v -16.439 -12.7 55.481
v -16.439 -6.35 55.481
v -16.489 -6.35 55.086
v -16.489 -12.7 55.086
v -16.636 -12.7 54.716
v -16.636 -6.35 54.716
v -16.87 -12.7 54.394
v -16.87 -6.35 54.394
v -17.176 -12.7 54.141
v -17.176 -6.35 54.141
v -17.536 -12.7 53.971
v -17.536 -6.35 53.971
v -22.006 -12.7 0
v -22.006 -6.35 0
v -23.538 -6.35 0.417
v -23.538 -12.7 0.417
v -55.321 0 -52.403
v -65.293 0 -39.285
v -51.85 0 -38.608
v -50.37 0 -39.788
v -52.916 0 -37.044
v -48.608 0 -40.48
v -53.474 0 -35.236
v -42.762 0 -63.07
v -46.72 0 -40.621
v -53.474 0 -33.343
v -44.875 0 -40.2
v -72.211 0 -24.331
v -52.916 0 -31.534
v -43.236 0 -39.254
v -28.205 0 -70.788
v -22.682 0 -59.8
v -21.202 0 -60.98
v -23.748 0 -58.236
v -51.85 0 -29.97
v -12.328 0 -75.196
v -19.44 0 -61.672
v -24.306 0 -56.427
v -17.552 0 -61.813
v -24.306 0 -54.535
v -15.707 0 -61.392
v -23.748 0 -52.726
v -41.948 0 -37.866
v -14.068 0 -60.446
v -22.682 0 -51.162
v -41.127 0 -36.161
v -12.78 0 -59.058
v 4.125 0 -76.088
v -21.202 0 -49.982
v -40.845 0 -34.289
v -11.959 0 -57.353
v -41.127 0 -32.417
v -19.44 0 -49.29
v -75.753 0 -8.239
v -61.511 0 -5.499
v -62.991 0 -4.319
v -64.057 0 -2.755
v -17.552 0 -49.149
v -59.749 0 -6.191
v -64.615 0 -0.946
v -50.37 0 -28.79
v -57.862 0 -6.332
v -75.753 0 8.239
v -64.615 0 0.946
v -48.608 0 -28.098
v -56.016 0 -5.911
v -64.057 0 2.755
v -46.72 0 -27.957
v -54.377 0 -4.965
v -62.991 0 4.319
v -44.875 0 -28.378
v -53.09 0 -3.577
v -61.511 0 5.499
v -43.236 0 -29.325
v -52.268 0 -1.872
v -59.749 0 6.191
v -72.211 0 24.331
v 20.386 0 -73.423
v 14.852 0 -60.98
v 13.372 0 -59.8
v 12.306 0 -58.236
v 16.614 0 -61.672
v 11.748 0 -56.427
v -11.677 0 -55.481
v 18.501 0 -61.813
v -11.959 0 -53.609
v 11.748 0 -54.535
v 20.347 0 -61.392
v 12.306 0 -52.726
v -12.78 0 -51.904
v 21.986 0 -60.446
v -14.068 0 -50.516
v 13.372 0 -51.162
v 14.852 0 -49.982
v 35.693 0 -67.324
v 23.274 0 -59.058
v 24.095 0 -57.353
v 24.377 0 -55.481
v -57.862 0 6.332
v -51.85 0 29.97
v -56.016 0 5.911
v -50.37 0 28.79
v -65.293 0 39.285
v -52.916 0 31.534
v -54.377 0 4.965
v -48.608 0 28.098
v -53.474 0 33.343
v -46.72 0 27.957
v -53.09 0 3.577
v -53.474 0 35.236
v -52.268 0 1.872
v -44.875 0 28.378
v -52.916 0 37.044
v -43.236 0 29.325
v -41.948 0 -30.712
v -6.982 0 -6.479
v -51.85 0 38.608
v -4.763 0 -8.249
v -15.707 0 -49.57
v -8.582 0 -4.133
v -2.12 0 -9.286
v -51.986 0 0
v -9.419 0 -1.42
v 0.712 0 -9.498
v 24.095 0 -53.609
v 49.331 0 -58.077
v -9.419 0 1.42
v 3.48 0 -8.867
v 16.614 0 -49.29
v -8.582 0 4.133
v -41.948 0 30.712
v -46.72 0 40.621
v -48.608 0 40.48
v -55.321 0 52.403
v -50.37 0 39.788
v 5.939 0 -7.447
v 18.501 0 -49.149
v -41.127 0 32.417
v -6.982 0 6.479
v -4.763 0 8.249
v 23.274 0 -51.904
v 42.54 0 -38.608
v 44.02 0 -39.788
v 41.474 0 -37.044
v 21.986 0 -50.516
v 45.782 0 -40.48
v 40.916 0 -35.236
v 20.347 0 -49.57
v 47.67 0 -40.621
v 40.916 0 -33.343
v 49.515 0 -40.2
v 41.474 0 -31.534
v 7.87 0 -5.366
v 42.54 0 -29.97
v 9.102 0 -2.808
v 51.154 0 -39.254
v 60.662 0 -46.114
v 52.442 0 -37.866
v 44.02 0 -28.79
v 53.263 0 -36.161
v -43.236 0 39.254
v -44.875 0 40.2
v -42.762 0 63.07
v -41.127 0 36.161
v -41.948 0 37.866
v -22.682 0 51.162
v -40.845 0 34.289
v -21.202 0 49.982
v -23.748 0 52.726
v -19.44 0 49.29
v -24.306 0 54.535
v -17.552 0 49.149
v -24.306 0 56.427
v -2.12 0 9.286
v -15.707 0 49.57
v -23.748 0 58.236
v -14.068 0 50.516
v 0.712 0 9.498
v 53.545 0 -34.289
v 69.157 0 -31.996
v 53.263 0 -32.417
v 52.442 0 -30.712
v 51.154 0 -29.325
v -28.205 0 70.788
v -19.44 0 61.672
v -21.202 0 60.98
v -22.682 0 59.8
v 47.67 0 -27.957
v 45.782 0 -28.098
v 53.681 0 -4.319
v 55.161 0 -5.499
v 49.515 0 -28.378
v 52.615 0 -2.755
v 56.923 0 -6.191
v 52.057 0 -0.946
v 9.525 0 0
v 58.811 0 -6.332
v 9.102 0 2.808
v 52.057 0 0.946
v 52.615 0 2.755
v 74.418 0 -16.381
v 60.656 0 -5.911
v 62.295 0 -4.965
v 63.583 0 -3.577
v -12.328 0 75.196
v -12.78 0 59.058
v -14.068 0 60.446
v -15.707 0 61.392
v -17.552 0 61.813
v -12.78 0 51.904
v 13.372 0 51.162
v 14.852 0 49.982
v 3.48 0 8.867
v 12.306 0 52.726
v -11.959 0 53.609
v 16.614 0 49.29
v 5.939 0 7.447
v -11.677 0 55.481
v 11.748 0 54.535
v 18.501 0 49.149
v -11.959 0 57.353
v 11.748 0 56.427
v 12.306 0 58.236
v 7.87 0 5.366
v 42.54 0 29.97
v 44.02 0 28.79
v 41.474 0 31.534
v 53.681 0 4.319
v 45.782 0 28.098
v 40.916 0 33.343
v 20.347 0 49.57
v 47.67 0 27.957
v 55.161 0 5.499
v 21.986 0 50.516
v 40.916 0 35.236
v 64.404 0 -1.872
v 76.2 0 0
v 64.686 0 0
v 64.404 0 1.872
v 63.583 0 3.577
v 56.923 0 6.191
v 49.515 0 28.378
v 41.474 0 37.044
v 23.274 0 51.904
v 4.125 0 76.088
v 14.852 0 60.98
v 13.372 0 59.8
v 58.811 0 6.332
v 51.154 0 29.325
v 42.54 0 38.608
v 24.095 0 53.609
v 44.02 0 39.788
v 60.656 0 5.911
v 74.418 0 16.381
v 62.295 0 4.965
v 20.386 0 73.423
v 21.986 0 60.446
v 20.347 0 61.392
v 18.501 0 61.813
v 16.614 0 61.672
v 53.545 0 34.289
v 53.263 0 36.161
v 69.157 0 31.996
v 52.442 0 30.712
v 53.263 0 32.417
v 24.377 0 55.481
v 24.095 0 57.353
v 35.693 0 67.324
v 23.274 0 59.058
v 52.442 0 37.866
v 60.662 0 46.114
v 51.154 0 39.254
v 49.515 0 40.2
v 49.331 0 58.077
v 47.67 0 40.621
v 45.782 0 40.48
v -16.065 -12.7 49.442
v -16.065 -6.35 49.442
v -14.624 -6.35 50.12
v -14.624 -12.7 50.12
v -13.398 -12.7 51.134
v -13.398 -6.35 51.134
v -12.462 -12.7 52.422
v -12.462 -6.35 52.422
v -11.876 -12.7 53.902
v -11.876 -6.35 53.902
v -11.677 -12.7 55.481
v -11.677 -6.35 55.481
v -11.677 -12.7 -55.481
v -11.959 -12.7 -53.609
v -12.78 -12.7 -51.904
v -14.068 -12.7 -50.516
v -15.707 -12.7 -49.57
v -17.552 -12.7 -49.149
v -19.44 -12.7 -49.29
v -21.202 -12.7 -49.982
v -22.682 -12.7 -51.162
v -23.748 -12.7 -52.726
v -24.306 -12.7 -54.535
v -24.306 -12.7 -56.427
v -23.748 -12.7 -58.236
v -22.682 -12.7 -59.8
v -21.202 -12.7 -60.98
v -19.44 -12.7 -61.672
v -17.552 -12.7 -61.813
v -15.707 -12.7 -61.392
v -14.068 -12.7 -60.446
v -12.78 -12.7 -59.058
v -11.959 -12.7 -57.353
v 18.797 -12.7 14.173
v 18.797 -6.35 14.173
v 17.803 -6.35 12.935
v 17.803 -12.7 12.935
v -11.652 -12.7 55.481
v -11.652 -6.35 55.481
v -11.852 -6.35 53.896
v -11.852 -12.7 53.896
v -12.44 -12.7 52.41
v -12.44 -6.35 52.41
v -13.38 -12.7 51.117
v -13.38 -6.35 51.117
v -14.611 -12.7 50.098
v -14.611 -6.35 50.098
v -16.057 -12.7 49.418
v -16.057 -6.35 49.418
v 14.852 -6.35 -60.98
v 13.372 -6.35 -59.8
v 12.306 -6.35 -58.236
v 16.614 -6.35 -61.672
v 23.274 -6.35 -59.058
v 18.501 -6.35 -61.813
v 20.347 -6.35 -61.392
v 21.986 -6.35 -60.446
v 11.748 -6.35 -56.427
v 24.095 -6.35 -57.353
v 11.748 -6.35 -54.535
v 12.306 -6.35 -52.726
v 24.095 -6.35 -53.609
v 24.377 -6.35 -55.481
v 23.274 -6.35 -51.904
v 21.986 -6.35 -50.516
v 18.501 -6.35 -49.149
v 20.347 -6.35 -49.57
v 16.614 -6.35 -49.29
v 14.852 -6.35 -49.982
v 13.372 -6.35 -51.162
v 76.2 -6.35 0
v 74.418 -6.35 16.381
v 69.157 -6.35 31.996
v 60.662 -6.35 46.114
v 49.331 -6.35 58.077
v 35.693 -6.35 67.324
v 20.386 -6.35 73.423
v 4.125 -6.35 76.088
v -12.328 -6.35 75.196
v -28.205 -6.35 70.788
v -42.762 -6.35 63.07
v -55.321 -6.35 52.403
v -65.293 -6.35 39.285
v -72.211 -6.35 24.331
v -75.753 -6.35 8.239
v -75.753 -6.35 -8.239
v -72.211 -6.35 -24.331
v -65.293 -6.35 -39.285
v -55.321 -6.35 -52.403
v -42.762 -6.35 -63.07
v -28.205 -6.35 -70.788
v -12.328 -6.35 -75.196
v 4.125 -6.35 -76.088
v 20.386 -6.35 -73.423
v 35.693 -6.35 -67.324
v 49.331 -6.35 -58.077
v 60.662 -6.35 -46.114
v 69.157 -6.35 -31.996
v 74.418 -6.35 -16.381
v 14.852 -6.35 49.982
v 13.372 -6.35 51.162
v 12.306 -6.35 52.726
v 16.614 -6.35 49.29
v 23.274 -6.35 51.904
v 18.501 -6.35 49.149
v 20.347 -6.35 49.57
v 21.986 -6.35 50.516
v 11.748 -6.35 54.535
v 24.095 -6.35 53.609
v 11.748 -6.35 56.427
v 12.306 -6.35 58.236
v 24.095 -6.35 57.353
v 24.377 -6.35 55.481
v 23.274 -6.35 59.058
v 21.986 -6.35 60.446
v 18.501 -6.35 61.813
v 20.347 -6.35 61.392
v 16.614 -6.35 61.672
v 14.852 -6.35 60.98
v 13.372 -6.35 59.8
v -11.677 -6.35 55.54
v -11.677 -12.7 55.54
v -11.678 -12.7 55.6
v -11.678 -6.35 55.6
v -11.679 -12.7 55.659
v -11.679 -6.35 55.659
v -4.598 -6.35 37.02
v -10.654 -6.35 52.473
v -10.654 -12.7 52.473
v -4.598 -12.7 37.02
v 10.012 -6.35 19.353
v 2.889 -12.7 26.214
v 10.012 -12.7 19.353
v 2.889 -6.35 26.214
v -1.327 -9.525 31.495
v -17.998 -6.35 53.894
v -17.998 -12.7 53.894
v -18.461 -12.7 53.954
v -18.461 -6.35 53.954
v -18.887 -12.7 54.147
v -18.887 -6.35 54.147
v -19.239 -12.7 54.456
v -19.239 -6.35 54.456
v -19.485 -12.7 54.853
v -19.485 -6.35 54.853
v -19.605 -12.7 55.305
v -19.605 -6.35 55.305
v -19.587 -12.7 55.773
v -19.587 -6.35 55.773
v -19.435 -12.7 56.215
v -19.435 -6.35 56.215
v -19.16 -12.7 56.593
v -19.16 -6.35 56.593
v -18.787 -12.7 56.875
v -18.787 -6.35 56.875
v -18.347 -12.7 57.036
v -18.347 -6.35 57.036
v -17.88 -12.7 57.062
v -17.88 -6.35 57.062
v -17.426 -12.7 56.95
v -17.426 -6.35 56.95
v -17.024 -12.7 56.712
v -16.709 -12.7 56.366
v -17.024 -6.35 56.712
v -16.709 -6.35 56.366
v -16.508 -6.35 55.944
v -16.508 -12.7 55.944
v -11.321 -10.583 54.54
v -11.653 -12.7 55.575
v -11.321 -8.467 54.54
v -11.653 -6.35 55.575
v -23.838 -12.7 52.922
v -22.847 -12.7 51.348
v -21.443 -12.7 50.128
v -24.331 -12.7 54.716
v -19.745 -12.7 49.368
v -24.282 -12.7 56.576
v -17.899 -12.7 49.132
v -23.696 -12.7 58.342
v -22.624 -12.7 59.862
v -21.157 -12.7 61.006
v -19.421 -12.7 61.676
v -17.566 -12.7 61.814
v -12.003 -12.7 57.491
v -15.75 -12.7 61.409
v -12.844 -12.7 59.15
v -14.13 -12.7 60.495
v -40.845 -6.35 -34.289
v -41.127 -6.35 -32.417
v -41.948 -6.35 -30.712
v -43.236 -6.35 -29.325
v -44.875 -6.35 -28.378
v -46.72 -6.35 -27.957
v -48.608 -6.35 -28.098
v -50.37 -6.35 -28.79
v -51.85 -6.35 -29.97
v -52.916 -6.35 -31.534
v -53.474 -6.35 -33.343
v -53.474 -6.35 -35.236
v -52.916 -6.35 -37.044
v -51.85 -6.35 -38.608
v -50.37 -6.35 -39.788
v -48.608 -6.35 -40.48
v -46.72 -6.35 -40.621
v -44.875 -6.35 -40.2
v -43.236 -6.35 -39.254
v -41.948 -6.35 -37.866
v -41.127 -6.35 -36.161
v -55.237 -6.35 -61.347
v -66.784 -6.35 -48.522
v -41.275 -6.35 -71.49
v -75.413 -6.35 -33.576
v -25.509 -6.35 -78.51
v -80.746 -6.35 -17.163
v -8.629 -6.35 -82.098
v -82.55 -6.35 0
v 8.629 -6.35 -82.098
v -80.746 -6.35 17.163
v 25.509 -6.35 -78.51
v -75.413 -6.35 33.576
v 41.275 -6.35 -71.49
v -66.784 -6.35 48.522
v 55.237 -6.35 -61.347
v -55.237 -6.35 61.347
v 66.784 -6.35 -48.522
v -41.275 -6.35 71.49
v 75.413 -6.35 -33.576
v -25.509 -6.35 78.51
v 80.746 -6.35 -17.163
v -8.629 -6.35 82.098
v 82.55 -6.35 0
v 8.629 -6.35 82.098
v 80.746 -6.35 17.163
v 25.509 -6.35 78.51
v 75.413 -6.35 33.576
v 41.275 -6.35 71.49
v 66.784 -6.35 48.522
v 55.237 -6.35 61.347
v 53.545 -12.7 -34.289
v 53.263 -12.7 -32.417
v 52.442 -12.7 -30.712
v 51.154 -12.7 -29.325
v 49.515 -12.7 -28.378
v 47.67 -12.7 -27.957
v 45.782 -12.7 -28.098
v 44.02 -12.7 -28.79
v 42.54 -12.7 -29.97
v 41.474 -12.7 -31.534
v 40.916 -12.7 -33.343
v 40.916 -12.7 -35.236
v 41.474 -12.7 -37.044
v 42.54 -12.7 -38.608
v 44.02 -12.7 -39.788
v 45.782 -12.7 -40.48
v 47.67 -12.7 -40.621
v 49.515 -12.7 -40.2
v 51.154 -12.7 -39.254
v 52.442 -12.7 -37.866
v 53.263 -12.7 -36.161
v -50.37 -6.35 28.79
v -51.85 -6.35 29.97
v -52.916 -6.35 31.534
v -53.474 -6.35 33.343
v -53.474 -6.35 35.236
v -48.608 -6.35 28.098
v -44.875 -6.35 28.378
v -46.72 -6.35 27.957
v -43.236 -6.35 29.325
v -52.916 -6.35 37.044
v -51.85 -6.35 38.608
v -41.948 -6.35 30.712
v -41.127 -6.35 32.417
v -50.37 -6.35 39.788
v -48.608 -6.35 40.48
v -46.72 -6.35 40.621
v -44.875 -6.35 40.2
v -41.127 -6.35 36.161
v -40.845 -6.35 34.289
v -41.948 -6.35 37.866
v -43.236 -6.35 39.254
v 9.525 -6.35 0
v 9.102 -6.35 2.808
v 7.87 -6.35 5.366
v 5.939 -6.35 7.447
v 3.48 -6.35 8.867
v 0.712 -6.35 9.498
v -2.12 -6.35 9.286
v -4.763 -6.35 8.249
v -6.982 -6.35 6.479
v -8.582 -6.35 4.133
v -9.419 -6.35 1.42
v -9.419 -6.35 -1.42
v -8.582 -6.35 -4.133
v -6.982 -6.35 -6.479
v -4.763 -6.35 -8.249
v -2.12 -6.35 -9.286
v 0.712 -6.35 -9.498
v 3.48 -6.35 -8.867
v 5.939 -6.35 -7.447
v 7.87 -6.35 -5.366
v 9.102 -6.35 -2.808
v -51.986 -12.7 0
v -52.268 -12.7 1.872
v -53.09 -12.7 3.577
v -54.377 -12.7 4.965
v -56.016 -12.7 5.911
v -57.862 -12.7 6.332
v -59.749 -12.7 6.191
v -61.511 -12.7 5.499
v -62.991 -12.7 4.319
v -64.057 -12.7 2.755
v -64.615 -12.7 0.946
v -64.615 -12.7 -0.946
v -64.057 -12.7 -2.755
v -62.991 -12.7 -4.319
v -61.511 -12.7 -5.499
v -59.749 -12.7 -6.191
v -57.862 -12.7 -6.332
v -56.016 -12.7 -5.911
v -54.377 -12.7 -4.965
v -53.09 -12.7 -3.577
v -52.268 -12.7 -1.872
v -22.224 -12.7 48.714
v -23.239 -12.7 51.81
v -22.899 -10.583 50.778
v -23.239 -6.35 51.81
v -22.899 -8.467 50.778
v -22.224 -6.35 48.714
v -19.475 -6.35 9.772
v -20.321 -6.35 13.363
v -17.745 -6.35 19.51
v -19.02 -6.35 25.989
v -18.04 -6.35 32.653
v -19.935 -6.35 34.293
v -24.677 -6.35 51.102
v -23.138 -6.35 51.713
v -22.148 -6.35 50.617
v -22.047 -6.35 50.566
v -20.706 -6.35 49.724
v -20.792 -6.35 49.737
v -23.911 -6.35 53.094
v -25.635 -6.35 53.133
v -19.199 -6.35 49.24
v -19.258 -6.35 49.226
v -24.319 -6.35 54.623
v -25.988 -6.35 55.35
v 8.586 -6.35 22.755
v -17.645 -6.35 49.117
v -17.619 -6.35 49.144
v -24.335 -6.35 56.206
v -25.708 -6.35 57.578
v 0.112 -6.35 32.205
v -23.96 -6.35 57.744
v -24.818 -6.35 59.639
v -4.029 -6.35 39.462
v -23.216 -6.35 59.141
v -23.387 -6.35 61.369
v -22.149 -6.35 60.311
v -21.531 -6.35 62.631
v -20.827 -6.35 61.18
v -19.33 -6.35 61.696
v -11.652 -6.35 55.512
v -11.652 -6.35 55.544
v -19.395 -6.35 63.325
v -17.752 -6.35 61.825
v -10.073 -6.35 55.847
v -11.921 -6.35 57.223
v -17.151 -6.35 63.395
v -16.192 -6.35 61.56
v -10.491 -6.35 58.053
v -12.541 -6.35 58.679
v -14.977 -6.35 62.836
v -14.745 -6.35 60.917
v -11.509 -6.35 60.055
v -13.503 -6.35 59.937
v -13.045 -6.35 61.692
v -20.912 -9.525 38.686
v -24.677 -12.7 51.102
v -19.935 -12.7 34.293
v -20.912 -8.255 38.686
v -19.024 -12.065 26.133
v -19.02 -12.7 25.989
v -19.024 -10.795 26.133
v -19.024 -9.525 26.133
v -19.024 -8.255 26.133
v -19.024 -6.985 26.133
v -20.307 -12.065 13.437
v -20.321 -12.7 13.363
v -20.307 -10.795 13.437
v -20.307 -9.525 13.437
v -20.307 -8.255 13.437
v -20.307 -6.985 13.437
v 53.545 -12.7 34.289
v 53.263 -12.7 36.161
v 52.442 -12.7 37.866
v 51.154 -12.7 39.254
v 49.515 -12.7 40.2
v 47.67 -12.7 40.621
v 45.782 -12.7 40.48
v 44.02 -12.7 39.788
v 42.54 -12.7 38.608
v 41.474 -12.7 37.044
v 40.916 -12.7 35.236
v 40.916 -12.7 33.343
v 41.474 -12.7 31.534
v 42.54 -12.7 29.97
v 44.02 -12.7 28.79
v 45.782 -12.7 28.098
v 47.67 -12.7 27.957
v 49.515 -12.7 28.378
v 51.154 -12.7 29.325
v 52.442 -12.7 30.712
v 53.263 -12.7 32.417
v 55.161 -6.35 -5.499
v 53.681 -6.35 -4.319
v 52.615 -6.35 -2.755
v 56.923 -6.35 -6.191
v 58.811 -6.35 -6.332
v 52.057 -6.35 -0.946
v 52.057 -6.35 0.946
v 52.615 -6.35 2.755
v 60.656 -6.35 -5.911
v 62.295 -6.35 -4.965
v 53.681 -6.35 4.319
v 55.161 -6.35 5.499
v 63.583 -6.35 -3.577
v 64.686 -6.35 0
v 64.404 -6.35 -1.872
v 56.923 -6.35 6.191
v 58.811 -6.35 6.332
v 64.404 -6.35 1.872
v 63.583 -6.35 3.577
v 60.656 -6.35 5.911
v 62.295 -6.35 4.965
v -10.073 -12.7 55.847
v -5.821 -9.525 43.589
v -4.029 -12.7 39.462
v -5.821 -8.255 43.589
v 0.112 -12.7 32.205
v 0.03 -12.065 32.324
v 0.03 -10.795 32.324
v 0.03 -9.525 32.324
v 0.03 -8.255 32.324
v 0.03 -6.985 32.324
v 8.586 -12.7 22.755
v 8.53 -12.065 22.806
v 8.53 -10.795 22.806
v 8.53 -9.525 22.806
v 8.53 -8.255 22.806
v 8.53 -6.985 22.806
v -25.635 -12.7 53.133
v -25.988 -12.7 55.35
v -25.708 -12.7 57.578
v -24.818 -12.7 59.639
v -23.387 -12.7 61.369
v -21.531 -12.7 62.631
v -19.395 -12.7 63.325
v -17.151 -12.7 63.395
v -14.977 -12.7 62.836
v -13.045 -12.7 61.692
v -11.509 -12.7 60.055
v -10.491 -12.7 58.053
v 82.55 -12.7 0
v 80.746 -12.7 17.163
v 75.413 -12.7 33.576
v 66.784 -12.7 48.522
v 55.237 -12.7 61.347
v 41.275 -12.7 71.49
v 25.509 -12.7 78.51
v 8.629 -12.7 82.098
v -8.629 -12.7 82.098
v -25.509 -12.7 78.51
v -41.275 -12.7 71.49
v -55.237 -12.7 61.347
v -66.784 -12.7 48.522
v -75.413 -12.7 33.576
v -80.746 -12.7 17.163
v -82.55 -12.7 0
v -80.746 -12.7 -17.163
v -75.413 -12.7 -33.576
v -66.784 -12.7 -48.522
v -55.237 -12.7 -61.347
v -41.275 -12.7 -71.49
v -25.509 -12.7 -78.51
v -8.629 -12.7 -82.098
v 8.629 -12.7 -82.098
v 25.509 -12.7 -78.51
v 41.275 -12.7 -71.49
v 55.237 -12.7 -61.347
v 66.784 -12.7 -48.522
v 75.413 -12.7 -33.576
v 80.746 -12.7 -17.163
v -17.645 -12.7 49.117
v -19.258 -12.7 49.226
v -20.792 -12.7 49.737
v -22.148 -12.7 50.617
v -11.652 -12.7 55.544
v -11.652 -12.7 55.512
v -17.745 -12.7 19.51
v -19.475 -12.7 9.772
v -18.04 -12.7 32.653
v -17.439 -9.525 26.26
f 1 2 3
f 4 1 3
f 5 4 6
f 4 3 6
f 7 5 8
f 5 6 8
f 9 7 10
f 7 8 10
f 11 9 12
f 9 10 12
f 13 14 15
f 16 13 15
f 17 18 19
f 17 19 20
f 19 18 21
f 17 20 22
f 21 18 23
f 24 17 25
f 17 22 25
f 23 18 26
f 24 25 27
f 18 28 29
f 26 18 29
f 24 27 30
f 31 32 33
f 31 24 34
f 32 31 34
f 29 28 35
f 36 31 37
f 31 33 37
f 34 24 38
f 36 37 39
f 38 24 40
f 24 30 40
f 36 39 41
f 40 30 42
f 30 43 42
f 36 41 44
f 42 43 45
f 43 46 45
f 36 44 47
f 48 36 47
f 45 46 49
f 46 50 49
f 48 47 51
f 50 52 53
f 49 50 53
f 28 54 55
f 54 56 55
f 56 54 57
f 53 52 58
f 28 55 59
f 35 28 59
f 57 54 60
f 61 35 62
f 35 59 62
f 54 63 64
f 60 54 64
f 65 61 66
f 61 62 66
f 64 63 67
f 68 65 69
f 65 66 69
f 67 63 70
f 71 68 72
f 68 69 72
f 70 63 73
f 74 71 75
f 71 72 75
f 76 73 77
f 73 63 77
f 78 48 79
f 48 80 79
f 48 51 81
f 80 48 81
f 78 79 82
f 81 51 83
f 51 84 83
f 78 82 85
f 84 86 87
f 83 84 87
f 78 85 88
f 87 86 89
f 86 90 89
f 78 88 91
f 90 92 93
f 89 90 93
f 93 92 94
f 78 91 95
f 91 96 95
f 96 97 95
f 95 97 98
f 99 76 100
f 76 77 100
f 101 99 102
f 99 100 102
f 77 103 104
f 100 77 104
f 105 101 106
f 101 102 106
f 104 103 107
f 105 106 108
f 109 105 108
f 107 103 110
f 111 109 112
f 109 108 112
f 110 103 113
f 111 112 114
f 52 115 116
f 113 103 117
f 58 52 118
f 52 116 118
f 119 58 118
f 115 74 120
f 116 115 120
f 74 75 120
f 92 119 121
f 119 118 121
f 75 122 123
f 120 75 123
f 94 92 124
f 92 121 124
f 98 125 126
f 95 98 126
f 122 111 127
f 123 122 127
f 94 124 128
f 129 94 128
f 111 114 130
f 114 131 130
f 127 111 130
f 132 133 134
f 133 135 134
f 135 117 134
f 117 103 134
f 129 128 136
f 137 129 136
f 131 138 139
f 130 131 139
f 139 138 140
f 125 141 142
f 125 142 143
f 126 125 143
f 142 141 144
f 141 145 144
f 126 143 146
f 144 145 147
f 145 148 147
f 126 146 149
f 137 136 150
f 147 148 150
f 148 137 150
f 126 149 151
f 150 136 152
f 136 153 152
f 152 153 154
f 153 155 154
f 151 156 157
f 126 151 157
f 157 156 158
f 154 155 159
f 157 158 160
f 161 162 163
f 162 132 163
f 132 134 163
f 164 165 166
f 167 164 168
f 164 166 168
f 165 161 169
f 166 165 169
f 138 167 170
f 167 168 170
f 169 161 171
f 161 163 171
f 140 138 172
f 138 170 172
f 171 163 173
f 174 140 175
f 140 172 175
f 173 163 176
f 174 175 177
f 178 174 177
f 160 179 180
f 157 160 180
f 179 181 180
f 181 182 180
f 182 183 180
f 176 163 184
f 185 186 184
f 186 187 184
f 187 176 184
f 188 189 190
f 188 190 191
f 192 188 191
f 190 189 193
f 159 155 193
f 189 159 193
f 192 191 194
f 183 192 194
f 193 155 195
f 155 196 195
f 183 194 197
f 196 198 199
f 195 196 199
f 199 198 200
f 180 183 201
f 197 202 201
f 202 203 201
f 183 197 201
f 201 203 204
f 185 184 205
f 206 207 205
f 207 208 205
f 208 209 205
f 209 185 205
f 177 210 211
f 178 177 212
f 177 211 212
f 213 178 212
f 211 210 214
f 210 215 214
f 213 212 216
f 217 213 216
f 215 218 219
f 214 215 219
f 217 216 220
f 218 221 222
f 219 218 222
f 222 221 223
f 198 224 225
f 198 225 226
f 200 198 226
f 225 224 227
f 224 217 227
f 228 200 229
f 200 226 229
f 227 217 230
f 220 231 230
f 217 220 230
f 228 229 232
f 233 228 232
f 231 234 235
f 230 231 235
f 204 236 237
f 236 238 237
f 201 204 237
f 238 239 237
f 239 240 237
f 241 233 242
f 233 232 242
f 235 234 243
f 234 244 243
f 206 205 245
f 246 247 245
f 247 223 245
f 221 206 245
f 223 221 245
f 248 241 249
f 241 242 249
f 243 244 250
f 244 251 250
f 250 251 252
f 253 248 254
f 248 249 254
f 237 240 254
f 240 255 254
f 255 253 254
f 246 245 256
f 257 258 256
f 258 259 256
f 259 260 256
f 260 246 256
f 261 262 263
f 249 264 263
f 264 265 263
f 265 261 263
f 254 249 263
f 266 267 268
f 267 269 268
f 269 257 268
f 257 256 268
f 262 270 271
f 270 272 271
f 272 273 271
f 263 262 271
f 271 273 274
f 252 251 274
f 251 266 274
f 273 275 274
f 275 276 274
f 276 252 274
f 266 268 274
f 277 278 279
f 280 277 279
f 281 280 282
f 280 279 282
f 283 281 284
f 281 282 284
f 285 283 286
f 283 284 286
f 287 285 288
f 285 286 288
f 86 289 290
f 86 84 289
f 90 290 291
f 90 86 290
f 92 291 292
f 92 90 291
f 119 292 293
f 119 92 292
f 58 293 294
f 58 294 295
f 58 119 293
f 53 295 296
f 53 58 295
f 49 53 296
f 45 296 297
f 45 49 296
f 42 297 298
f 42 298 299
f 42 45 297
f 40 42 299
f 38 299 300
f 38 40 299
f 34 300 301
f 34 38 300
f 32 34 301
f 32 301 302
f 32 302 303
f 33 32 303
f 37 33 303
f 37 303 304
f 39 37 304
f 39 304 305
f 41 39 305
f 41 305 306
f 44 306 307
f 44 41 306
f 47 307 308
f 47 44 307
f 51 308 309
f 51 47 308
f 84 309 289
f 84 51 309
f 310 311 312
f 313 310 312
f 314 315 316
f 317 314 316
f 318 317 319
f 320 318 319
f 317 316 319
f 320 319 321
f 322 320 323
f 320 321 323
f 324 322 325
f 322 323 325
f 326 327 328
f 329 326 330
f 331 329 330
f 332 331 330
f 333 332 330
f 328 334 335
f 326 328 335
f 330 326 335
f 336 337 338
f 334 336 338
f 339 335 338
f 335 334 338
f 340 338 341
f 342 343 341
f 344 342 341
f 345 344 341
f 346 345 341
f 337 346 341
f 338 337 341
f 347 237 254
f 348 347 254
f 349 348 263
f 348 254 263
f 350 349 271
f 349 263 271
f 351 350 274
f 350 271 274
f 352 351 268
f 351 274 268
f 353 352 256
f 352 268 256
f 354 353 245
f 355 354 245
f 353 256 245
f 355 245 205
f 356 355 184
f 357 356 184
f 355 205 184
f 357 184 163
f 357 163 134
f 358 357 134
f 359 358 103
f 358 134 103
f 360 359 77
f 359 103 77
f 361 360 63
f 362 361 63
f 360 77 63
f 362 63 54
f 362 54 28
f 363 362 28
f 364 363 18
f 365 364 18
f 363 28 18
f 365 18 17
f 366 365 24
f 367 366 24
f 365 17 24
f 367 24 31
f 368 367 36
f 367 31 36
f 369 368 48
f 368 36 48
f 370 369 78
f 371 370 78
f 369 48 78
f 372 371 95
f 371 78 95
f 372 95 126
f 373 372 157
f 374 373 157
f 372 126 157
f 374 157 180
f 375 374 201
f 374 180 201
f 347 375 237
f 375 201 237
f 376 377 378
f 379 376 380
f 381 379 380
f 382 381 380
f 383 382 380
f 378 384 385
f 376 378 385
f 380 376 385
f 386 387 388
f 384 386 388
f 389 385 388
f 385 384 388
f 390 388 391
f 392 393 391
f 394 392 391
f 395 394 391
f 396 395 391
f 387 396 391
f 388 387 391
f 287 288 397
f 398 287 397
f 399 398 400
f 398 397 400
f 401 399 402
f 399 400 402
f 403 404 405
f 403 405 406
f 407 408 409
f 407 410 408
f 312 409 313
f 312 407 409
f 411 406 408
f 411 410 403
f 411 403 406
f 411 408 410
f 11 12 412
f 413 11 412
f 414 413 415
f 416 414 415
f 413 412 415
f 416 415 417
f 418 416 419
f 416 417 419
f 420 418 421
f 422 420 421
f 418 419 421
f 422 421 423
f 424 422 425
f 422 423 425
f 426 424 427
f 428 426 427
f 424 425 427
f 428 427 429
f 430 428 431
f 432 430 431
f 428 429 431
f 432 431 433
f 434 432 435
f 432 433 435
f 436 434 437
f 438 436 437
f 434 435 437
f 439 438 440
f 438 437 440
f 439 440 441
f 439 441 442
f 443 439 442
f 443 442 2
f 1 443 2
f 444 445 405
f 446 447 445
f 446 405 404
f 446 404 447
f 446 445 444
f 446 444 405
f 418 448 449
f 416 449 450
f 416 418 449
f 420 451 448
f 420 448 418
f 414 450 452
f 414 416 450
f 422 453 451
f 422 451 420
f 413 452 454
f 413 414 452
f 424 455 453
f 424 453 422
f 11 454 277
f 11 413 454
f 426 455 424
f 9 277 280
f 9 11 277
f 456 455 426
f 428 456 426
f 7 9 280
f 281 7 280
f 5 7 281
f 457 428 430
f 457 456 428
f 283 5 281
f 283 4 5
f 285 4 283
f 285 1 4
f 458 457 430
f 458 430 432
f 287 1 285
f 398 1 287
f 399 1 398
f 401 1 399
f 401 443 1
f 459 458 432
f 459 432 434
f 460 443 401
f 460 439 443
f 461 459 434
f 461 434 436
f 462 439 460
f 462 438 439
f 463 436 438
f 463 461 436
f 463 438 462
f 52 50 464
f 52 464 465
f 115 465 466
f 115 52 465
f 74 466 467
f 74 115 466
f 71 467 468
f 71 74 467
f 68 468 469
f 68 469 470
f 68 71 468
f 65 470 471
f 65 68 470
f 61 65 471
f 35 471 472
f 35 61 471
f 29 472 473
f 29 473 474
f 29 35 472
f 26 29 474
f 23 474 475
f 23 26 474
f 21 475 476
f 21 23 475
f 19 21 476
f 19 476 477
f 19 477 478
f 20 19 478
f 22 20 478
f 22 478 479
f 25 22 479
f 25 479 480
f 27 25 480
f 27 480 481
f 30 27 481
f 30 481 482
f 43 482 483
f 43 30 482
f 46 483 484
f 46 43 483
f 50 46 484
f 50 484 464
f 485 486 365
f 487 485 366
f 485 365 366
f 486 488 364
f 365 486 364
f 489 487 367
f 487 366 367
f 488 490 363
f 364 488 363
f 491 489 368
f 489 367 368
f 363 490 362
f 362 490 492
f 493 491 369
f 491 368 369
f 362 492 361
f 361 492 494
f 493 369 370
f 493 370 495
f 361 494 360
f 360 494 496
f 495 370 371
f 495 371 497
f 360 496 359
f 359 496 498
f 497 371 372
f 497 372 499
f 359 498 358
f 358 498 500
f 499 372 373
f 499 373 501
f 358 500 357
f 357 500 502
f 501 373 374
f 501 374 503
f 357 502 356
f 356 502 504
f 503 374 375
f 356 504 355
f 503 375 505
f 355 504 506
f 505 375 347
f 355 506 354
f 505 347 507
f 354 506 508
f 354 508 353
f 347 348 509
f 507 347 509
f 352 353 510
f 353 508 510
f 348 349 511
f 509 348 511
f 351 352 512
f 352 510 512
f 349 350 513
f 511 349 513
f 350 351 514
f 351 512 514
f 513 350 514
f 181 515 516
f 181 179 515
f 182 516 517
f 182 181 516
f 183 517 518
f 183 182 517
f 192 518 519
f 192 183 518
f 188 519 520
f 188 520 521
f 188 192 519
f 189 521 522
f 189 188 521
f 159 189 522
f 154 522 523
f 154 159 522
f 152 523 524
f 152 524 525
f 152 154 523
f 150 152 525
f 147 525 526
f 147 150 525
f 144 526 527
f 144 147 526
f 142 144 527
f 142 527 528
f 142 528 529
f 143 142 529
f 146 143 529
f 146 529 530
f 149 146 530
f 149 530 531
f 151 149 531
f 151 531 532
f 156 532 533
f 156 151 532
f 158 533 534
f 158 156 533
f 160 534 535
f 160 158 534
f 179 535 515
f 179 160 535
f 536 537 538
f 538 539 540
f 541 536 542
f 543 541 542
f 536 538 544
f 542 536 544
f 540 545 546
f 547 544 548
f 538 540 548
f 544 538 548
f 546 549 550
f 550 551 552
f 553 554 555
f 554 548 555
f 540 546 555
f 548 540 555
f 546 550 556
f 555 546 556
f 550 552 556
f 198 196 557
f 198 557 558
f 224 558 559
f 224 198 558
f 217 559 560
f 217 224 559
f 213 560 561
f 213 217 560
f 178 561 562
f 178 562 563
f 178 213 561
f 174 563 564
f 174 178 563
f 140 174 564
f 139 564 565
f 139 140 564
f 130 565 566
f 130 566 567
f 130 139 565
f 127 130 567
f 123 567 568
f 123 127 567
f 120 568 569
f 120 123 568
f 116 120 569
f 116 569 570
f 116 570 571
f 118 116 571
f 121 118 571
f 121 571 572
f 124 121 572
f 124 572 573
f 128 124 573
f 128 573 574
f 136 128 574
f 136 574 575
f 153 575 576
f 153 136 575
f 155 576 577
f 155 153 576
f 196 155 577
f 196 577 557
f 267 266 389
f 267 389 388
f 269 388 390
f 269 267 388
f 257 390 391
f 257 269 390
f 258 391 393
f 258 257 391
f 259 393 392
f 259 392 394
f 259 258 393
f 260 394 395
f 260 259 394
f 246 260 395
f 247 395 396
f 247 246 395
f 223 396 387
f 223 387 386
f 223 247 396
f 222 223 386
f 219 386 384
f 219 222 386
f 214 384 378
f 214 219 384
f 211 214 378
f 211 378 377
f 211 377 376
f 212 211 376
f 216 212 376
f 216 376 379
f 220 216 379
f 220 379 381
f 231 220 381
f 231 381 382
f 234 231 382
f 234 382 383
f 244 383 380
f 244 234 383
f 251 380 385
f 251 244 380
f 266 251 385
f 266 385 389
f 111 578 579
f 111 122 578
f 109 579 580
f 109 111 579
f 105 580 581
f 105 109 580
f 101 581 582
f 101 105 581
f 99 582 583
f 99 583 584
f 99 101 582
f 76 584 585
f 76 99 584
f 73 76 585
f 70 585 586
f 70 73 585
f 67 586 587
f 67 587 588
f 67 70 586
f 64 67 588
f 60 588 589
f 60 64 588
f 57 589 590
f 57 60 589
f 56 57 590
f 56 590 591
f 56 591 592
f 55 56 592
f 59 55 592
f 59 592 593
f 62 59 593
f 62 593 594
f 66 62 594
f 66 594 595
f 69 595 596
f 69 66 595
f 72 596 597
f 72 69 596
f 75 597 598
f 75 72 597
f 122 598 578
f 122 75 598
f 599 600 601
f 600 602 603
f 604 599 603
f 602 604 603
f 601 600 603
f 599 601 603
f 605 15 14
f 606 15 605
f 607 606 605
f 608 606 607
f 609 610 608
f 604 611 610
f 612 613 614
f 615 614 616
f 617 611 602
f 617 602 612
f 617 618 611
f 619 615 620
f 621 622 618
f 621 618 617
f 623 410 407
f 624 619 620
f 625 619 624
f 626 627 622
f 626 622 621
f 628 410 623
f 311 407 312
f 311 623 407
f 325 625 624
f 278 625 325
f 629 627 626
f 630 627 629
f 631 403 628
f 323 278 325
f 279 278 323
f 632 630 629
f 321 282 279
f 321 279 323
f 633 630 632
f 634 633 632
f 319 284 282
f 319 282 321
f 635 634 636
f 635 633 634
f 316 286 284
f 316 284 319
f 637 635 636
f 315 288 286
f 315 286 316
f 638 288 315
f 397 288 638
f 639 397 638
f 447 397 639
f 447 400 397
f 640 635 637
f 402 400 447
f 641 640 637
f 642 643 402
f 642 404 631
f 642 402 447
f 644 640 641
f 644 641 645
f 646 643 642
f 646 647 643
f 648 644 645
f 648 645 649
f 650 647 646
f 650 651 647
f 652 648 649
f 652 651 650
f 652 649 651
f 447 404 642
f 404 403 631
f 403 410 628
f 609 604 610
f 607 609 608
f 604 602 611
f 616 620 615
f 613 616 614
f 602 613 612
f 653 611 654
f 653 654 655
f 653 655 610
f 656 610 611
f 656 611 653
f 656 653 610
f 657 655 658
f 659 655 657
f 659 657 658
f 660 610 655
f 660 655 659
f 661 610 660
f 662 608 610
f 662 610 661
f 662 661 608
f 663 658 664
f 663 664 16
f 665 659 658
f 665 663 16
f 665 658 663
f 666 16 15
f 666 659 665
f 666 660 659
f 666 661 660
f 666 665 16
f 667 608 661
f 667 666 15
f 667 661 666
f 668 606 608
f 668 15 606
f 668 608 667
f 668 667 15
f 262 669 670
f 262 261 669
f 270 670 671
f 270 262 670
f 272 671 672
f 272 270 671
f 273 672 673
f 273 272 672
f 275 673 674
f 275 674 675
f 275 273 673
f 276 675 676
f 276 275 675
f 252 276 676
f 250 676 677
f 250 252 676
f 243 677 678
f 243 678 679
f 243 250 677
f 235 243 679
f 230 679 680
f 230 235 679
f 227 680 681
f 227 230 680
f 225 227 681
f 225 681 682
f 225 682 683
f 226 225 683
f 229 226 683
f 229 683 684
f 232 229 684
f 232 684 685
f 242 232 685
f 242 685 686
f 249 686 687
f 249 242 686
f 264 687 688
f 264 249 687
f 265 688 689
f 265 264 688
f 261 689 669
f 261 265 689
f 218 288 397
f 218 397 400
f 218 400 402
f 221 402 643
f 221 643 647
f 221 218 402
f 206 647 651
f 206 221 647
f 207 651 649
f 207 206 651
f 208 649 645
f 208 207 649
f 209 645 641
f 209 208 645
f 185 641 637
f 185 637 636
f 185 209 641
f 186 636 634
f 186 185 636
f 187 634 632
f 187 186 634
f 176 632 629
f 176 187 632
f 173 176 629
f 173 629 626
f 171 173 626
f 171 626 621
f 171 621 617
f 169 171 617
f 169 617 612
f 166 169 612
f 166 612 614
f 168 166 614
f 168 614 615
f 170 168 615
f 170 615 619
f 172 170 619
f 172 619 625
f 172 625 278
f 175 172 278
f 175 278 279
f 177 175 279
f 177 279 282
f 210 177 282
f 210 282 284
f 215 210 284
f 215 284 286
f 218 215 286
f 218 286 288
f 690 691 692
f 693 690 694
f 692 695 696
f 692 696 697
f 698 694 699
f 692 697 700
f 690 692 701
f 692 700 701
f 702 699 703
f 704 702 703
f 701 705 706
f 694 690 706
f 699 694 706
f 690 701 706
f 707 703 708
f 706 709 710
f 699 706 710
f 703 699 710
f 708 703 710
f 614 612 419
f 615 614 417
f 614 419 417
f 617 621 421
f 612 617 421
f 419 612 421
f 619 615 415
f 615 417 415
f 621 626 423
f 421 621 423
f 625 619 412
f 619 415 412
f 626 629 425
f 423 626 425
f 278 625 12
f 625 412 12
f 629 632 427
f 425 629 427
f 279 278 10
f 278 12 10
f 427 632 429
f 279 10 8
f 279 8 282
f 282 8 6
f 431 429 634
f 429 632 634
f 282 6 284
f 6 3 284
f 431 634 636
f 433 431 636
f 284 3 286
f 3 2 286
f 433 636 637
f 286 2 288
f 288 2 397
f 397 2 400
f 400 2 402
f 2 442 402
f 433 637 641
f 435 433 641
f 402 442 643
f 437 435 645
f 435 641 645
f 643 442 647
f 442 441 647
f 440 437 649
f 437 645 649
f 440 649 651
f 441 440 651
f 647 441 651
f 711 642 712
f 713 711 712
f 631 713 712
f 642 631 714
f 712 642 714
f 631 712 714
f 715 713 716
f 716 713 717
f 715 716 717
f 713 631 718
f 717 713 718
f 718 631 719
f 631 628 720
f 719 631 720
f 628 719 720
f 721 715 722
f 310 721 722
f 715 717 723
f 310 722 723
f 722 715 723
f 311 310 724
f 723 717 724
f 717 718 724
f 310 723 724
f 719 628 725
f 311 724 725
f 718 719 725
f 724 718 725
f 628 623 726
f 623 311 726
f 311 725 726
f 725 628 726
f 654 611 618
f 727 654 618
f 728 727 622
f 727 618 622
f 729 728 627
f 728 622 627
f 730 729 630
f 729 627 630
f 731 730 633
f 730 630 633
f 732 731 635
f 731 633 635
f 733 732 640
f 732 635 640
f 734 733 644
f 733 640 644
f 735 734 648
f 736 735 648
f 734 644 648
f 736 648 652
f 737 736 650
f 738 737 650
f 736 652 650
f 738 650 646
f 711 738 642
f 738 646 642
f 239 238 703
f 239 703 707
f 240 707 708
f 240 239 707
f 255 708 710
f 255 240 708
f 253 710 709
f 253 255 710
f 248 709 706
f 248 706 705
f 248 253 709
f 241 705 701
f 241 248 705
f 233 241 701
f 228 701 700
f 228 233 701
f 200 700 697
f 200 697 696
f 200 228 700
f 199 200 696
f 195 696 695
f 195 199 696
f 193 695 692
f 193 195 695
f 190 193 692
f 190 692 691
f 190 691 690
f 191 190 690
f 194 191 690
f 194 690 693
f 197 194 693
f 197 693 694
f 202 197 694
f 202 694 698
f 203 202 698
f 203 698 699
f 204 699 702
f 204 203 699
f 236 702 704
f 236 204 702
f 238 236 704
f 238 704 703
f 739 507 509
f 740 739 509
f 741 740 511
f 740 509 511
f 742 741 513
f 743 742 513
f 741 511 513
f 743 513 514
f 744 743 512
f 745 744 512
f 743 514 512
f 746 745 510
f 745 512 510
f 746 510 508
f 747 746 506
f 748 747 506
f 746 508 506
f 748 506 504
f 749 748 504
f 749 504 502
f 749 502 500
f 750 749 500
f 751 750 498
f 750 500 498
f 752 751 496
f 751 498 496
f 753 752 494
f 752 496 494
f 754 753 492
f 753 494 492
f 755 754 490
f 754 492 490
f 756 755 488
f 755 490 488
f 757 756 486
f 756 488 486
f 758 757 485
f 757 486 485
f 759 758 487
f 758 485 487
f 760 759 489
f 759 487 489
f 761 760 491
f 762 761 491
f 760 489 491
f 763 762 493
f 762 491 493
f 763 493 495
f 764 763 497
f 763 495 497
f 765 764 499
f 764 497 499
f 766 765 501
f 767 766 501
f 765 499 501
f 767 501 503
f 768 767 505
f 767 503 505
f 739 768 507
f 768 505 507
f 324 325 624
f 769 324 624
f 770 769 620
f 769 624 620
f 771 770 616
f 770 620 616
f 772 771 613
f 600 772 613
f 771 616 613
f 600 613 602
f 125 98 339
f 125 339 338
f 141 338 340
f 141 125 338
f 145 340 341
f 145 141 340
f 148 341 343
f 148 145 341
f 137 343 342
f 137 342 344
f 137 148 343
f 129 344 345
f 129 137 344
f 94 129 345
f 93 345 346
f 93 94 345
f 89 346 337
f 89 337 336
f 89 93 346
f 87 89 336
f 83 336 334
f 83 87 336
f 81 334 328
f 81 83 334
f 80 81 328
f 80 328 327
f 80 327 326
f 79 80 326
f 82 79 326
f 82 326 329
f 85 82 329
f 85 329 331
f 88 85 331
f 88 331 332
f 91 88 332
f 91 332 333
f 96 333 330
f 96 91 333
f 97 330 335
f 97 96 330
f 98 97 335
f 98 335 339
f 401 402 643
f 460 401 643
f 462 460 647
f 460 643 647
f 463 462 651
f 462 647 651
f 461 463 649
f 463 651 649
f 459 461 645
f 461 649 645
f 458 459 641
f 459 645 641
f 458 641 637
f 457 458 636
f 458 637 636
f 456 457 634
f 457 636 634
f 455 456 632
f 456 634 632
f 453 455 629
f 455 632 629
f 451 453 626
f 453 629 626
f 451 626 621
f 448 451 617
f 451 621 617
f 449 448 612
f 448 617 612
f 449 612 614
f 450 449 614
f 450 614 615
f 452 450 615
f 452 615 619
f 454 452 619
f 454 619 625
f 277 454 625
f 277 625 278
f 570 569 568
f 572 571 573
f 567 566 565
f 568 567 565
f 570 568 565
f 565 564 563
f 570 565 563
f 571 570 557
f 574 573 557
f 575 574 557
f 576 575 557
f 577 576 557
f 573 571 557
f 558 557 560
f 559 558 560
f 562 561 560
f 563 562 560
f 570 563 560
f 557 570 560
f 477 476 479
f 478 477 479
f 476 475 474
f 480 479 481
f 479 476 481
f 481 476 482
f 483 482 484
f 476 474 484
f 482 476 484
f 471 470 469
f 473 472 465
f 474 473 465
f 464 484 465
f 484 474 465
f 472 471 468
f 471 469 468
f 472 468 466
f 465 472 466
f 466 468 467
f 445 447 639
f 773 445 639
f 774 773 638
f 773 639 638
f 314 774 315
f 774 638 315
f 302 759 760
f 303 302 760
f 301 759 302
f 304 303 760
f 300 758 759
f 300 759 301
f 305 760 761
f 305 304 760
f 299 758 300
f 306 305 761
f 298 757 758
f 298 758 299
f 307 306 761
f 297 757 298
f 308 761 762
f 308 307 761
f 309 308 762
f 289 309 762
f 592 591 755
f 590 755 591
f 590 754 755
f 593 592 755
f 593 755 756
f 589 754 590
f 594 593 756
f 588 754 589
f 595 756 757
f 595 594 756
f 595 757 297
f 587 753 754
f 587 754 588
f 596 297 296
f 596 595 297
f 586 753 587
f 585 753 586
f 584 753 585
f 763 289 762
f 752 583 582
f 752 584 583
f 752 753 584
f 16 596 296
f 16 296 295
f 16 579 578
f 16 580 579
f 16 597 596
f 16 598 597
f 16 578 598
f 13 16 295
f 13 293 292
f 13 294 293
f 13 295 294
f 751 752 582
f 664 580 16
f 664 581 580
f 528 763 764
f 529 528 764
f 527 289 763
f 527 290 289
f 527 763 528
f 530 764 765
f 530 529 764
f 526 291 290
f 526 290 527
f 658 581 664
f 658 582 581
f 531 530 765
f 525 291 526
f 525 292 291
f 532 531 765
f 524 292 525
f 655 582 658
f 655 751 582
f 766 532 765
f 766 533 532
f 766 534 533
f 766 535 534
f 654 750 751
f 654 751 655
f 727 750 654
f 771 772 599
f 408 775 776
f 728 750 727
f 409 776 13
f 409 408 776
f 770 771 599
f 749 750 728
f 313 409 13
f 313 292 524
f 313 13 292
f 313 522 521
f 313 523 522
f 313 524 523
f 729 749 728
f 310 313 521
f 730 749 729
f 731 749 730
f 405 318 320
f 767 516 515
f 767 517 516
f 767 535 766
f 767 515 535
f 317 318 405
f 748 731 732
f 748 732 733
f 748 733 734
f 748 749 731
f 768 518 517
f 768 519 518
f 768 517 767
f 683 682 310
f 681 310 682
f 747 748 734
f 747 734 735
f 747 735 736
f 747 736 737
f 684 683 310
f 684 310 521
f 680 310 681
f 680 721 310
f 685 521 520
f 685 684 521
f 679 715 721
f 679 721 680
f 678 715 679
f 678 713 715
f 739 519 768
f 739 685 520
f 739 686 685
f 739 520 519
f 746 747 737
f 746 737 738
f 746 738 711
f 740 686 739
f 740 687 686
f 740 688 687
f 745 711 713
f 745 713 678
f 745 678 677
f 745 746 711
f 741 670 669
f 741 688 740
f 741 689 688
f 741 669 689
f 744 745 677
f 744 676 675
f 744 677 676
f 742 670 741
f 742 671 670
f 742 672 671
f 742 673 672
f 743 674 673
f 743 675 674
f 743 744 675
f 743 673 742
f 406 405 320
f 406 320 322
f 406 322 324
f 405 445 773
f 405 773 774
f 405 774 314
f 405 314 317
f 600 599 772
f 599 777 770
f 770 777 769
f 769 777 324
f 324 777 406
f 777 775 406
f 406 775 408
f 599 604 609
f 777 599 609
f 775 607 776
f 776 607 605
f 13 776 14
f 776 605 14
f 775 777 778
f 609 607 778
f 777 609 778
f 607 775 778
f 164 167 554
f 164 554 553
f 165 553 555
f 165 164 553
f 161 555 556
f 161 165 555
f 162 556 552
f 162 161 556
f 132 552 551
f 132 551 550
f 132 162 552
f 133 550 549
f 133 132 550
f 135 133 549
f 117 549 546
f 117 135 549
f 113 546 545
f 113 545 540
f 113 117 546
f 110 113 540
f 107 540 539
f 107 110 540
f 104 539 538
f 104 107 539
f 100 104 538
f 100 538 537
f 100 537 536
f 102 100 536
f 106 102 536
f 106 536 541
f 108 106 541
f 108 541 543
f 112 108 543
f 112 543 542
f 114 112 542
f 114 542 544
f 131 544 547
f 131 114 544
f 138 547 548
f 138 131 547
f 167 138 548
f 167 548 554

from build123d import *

# Parameters (mm, degrees)
F0_R     = 76.2
F0_R_2   = 6.35
F0_R_3   = 9.525
F1_DEPTH = 6.35
F2_R     = 82.55
F2_R_2   = 76.2
F2_R_3   = 6.35
F3_DEPTH = 6.35


# Not quite as in the source:
# - a length typed as a fraction of an inch, garbled in the dataset ("3 / 203.2 mm" for 3/8 in), is restored
# - the dataset's text gives a spline's control points without its knots; the knots are read off the source's solid


with BuildPart() as f1:
    # F0 (on Front) → F1 (new body)
    with BuildSketch(Plane.XZ):
        Circle(F0_R)
        with Locations((-18.0268847294, -55.4810463583)):
            Circle(F0_R_2, mode=Mode.SUBTRACT)
        with Locations((-47.1949969329, -34.2891723808)):
            Circle(F0_R_2, mode=Mode.SUBTRACT)
        with Locations((18.0268847294, -55.4810463583)):
            Circle(F0_R_2, mode=Mode.SUBTRACT)
        with Locations((47.1949969329, -34.2891723808)):
            Circle(F0_R_2, mode=Mode.SUBTRACT)
        with Locations((-58.336224407, 0)):
            Circle(F0_R_2, mode=Mode.SUBTRACT)
        with Locations((-47.1949969329, 34.2891723808)):
            Circle(F0_R_2, mode=Mode.SUBTRACT)
        with Locations((-18.0268847294, 55.4810463583)):
            Circle(F0_R_2, mode=Mode.SUBTRACT)
        Circle(F0_R_3, mode=Mode.SUBTRACT)
        with Locations((58.336224407, 0)):
            Circle(F0_R_2, mode=Mode.SUBTRACT)
        with Locations((47.1949969329, 34.2891723808)):
            Circle(F0_R_2, mode=Mode.SUBTRACT)
        with Locations((18.0268847294, 55.4810463583)):
            Circle(F0_R_2, mode=Mode.SUBTRACT)
    extrude(amount=F1_DEPTH)

    # F2 (on face) → F3 (join)
    with BuildSketch(Plane.XZ.offset(6.35)):
        Circle(F2_R)
        Circle(F2_R_2, mode=Mode.SUBTRACT)
        Circle(F2_R_2)
        with Locations((-18.0268847294, -55.4810463583)):
            Circle(F2_R_3, mode=Mode.SUBTRACT)
        with Locations((-47.1949969329, -34.2891723808)):
            Circle(F2_R_3, mode=Mode.SUBTRACT)
        with Locations((18.0268847294, -55.4810463583)):
            Circle(F2_R_3, mode=Mode.SUBTRACT)
        with Locations((47.1949969329, -34.2891723808)):
            Circle(F2_R_3, mode=Mode.SUBTRACT)
        with Locations((-58.336224407, 0)):
            Circle(F2_R_3, mode=Mode.SUBTRACT)
        with Locations((-47.1949969329, 34.2891723808)):
            Circle(F2_R_3, mode=Mode.SUBTRACT)
        with BuildLine():
            add(Edge.make_bspline(
                [(-10.6542657196, 52.4734320289), (-8.2332526855, 45.0247226448), (-2.5822173462, 29.3020077299), (10.6983686228, 18.6386544846), (17.8031913761, 12.934775669)],
                knots=[0.0620717582, 0.0620717582, 0.0620717582, 0.0620717582, 0.4982746672, 1, 1, 1, 1], degree=3))
            ThreePointArc((-10.6542657196, 52.4734320289), (-12.6062796926, 49.6485258008), (-15.5663398463, 47.908267879))
            ThreePointArc((-15.5663398463, 47.908267879), (-18.9839767566, 47.5762864081), (-22.223627454, 48.7143185285))
            add(Edge.make_bspline(
                [(-22.223627454, 48.7143185285), (-19.8040266177, 41.2651502936), (-15.13423029, 25.2236114971), (-19.6106882565, 8.7906449303), (-22.0059547573, 0)],
                knots=[0.0620717582, 0.0620717582, 0.0620717582, 0.0620717582, 0.4982746672, 1, 1, 1, 1], degree=3))
            Line((-22.0059547573, 0), (-23.5376137966, 0.4173449862))
            add(Edge.make_bspline(
                [(-24.6771337574, 51.1020689794), (-24.0063692851, 49.0670118083), (-22.6416674455, 44.9146579119), (-20.8291476072, 38.6791660774), (-19.7093838867, 33.4359520654), (-19.1757596195, 29.2572537264), (-18.9844511798, 26.1346205763), (-19.0278027605, 23.000080355), (-19.360603347, 18.7820552575), (-20.2248090599, 13.4503695291), (-21.7522886479, 6.9703254819), (-22.940861019, 2.6074318834), (-23.5376137966, 0.4173449862)],
                knots=[0.0057570398, 0.0057570398, 0.0057570398, 0.0057570398, 0.125, 0.25, 0.375, 0.4375, 0.5, 0.5625, 0.625, 0.75, 0.875, 1, 1, 1, 1], degree=3))
            ThreePointArc((-24.6771337574, 51.1020689794), (-20.4874296126, 63.0538248376), (-10.0728219256, 55.8472975435))
            add(Edge.make_bspline(
                [(-10.0728219256, 55.8472975435), (-9.4193051901, 53.806636243), (-8.0826797879, 49.645159759), (-5.8839089986, 43.5351684662), (-3.7079330074, 38.6351386244), (-1.6834668507, 34.9408441793), (-0.0028009157, 32.3021326141), (1.8747077646, 29.7917177253), (4.623242041, 26.5748790154), (8.4562853904, 22.7694220255), (13.5009166607, 18.424786242), (17.0269364225, 15.5937564872), (18.7970203404, 14.1727014502)],
                knots=[0.0057570398, 0.0057570398, 0.0057570398, 0.0057570398, 0.125, 0.25, 0.375, 0.4375, 0.5, 0.5625, 0.625, 0.75, 0.875, 1, 1, 1, 1], degree=3))
            Line((18.7970203404, 14.1727014502), (17.8031913761, 12.934775669))
        make_face(mode=Mode.SUBTRACT)
        with BuildLine():
            ThreePointArc((9.525, 0), (-5.5986545281, -7.7058868714), (-2.9433868714, 9.0588133177))
            ThreePointArc((-2.9433868714, 9.0588133177), (5.5986545281, 7.7058868714), (9.525, 0))
        make_face(mode=Mode.SUBTRACT)
        with Locations((58.336224407, 0)):
            Circle(F2_R_3, mode=Mode.SUBTRACT)
        with Locations((47.1949969329, 34.2891723808)):
            Circle(F2_R_3, mode=Mode.SUBTRACT)
        with Locations((18.0268847294, 55.4810463583)):
            Circle(F2_R_3, mode=Mode.SUBTRACT)
        with BuildLine():
            ThreePointArc((9.525, 0), (5.5986545281, 7.7058868714), (-2.9433868714, 9.0588133177))
            ThreePointArc((-2.9433868714, 9.0588133177), (-5.5986545281, -7.7058868714), (9.525, 0))
        make_face()
        with BuildLine():
            ThreePointArc((6.35, 0), (-3.7324363521, -5.1372579143), (-1.9622579143, 6.0392088785))
            ThreePointArc((-1.9622579143, 6.0392088785), (3.7324363521, 5.1372579143), (6.35, 0))
        make_face(mode=Mode.SUBTRACT)
        with BuildLine():
            ThreePointArc((-11.6768847294, 55.4810463583), (-11.6775070317, 55.5699443457), (-11.6793738167, 55.6588249089))
            ThreePointArc((-11.6793738167, 55.6588249089), (-19.9891426437, 61.5202552368), (-23.26662454, 51.8938989238))
            ThreePointArc((-23.26662454, 51.8938989238), (-20.0734973519, 49.4699003134), (-16.0646268151, 49.4418374798))
            ThreePointArc((-16.0646268151, 49.4418374798), (-12.8896268151, 51.7486100062), (-11.6768847294, 55.4810463583))
        make_face()
        with BuildLine():
            ThreePointArc((-16.4393847294, 55.4810463583), (-16.7425702509, 54.5479372703), (-17.5363202509, 53.9712441387))
            ThreePointArc((-17.5363202509, 53.9712441387), (-19.311199208, 56.4141554463), (-16.4393847294, 55.4810463583))
        make_face(mode=Mode.SUBTRACT)
        with BuildLine():
            ThreePointArc((6.35, 0), (3.7324363521, 5.1372579143), (-1.9622579143, 6.0392088785))
            ThreePointArc((-1.9622579143, 6.0392088785), (-3.7324363521, -5.1372579143), (6.35, 0))
        make_face()
        with Locations((-47.1949969329, -34.2891723808)):
            Circle(F2_R_3)
        with Locations((18.0268847294, -55.4810463583)):
            Circle(F2_R_3)
        with Locations((-47.1949969329, 34.2891723808)):
            Circle(F2_R_3)
        with Locations((58.336224407, 0)):
            Circle(F2_R_3)
        with Locations((18.0268847294, 55.4810463583)):
            Circle(F2_R_3)
        with BuildLine():
            ThreePointArc((-11.6525891829, 55.5751750194), (-11.6520679675, 55.5281119716), (-11.6518942259, 55.4810463583))
            ThreePointArc((-11.6518942259, 55.4810463583), (-12.8694090731, 51.7339209568), (-16.0569043249, 49.4180700986))
            Line((-16.0569043249, 49.4180700986), (-15.5663398463, 47.908267879))
            ThreePointArc((-15.5663398463, 47.908267879), (-12.6062796926, 49.6485258008), (-10.6542657196, 52.4734320289))
            add(Edge.make_bspline(
                [(-11.6525891829, 55.5751750194), (-11.3212318788, 54.5403378936), (-10.9897372013, 53.5055741688), (-10.6542657196, 52.4734320289)],
                knots=[0.0016286156, 0.0016286156, 0.0016286156, 0.0016286156, 0.0620717582, 0.0620717582, 0.0620717582, 0.0620717582], degree=3))
        make_face()
        with BuildLine():
            Line((-15.5663398463, 47.908267879), (-16.0569043249, 49.4180700986))
            ThreePointArc((-16.0569043249, 49.4180700986), (-20.0415735031, 49.4327794111), (-23.2391255926, 51.8104811288))
            add(Edge.make_bspline(
                [(-23.2391255926, 51.8104811288), (-22.8989372817, 50.778513371), (-22.5589032523, 49.7465242498), (-22.223627454, 48.7143185285)],
                knots=[0.0016286156, 0.0016286156, 0.0016286156, 0.0016286156, 0.0620717582, 0.0620717582, 0.0620717582, 0.0620717582], degree=3))
            ThreePointArc((-22.223627454, 48.7143185285), (-18.9839767566, 47.5762864081), (-15.5663398463, 47.908267879))
        make_face()
    extrude(amount=F3_DEPTH)


solid = f1.part
